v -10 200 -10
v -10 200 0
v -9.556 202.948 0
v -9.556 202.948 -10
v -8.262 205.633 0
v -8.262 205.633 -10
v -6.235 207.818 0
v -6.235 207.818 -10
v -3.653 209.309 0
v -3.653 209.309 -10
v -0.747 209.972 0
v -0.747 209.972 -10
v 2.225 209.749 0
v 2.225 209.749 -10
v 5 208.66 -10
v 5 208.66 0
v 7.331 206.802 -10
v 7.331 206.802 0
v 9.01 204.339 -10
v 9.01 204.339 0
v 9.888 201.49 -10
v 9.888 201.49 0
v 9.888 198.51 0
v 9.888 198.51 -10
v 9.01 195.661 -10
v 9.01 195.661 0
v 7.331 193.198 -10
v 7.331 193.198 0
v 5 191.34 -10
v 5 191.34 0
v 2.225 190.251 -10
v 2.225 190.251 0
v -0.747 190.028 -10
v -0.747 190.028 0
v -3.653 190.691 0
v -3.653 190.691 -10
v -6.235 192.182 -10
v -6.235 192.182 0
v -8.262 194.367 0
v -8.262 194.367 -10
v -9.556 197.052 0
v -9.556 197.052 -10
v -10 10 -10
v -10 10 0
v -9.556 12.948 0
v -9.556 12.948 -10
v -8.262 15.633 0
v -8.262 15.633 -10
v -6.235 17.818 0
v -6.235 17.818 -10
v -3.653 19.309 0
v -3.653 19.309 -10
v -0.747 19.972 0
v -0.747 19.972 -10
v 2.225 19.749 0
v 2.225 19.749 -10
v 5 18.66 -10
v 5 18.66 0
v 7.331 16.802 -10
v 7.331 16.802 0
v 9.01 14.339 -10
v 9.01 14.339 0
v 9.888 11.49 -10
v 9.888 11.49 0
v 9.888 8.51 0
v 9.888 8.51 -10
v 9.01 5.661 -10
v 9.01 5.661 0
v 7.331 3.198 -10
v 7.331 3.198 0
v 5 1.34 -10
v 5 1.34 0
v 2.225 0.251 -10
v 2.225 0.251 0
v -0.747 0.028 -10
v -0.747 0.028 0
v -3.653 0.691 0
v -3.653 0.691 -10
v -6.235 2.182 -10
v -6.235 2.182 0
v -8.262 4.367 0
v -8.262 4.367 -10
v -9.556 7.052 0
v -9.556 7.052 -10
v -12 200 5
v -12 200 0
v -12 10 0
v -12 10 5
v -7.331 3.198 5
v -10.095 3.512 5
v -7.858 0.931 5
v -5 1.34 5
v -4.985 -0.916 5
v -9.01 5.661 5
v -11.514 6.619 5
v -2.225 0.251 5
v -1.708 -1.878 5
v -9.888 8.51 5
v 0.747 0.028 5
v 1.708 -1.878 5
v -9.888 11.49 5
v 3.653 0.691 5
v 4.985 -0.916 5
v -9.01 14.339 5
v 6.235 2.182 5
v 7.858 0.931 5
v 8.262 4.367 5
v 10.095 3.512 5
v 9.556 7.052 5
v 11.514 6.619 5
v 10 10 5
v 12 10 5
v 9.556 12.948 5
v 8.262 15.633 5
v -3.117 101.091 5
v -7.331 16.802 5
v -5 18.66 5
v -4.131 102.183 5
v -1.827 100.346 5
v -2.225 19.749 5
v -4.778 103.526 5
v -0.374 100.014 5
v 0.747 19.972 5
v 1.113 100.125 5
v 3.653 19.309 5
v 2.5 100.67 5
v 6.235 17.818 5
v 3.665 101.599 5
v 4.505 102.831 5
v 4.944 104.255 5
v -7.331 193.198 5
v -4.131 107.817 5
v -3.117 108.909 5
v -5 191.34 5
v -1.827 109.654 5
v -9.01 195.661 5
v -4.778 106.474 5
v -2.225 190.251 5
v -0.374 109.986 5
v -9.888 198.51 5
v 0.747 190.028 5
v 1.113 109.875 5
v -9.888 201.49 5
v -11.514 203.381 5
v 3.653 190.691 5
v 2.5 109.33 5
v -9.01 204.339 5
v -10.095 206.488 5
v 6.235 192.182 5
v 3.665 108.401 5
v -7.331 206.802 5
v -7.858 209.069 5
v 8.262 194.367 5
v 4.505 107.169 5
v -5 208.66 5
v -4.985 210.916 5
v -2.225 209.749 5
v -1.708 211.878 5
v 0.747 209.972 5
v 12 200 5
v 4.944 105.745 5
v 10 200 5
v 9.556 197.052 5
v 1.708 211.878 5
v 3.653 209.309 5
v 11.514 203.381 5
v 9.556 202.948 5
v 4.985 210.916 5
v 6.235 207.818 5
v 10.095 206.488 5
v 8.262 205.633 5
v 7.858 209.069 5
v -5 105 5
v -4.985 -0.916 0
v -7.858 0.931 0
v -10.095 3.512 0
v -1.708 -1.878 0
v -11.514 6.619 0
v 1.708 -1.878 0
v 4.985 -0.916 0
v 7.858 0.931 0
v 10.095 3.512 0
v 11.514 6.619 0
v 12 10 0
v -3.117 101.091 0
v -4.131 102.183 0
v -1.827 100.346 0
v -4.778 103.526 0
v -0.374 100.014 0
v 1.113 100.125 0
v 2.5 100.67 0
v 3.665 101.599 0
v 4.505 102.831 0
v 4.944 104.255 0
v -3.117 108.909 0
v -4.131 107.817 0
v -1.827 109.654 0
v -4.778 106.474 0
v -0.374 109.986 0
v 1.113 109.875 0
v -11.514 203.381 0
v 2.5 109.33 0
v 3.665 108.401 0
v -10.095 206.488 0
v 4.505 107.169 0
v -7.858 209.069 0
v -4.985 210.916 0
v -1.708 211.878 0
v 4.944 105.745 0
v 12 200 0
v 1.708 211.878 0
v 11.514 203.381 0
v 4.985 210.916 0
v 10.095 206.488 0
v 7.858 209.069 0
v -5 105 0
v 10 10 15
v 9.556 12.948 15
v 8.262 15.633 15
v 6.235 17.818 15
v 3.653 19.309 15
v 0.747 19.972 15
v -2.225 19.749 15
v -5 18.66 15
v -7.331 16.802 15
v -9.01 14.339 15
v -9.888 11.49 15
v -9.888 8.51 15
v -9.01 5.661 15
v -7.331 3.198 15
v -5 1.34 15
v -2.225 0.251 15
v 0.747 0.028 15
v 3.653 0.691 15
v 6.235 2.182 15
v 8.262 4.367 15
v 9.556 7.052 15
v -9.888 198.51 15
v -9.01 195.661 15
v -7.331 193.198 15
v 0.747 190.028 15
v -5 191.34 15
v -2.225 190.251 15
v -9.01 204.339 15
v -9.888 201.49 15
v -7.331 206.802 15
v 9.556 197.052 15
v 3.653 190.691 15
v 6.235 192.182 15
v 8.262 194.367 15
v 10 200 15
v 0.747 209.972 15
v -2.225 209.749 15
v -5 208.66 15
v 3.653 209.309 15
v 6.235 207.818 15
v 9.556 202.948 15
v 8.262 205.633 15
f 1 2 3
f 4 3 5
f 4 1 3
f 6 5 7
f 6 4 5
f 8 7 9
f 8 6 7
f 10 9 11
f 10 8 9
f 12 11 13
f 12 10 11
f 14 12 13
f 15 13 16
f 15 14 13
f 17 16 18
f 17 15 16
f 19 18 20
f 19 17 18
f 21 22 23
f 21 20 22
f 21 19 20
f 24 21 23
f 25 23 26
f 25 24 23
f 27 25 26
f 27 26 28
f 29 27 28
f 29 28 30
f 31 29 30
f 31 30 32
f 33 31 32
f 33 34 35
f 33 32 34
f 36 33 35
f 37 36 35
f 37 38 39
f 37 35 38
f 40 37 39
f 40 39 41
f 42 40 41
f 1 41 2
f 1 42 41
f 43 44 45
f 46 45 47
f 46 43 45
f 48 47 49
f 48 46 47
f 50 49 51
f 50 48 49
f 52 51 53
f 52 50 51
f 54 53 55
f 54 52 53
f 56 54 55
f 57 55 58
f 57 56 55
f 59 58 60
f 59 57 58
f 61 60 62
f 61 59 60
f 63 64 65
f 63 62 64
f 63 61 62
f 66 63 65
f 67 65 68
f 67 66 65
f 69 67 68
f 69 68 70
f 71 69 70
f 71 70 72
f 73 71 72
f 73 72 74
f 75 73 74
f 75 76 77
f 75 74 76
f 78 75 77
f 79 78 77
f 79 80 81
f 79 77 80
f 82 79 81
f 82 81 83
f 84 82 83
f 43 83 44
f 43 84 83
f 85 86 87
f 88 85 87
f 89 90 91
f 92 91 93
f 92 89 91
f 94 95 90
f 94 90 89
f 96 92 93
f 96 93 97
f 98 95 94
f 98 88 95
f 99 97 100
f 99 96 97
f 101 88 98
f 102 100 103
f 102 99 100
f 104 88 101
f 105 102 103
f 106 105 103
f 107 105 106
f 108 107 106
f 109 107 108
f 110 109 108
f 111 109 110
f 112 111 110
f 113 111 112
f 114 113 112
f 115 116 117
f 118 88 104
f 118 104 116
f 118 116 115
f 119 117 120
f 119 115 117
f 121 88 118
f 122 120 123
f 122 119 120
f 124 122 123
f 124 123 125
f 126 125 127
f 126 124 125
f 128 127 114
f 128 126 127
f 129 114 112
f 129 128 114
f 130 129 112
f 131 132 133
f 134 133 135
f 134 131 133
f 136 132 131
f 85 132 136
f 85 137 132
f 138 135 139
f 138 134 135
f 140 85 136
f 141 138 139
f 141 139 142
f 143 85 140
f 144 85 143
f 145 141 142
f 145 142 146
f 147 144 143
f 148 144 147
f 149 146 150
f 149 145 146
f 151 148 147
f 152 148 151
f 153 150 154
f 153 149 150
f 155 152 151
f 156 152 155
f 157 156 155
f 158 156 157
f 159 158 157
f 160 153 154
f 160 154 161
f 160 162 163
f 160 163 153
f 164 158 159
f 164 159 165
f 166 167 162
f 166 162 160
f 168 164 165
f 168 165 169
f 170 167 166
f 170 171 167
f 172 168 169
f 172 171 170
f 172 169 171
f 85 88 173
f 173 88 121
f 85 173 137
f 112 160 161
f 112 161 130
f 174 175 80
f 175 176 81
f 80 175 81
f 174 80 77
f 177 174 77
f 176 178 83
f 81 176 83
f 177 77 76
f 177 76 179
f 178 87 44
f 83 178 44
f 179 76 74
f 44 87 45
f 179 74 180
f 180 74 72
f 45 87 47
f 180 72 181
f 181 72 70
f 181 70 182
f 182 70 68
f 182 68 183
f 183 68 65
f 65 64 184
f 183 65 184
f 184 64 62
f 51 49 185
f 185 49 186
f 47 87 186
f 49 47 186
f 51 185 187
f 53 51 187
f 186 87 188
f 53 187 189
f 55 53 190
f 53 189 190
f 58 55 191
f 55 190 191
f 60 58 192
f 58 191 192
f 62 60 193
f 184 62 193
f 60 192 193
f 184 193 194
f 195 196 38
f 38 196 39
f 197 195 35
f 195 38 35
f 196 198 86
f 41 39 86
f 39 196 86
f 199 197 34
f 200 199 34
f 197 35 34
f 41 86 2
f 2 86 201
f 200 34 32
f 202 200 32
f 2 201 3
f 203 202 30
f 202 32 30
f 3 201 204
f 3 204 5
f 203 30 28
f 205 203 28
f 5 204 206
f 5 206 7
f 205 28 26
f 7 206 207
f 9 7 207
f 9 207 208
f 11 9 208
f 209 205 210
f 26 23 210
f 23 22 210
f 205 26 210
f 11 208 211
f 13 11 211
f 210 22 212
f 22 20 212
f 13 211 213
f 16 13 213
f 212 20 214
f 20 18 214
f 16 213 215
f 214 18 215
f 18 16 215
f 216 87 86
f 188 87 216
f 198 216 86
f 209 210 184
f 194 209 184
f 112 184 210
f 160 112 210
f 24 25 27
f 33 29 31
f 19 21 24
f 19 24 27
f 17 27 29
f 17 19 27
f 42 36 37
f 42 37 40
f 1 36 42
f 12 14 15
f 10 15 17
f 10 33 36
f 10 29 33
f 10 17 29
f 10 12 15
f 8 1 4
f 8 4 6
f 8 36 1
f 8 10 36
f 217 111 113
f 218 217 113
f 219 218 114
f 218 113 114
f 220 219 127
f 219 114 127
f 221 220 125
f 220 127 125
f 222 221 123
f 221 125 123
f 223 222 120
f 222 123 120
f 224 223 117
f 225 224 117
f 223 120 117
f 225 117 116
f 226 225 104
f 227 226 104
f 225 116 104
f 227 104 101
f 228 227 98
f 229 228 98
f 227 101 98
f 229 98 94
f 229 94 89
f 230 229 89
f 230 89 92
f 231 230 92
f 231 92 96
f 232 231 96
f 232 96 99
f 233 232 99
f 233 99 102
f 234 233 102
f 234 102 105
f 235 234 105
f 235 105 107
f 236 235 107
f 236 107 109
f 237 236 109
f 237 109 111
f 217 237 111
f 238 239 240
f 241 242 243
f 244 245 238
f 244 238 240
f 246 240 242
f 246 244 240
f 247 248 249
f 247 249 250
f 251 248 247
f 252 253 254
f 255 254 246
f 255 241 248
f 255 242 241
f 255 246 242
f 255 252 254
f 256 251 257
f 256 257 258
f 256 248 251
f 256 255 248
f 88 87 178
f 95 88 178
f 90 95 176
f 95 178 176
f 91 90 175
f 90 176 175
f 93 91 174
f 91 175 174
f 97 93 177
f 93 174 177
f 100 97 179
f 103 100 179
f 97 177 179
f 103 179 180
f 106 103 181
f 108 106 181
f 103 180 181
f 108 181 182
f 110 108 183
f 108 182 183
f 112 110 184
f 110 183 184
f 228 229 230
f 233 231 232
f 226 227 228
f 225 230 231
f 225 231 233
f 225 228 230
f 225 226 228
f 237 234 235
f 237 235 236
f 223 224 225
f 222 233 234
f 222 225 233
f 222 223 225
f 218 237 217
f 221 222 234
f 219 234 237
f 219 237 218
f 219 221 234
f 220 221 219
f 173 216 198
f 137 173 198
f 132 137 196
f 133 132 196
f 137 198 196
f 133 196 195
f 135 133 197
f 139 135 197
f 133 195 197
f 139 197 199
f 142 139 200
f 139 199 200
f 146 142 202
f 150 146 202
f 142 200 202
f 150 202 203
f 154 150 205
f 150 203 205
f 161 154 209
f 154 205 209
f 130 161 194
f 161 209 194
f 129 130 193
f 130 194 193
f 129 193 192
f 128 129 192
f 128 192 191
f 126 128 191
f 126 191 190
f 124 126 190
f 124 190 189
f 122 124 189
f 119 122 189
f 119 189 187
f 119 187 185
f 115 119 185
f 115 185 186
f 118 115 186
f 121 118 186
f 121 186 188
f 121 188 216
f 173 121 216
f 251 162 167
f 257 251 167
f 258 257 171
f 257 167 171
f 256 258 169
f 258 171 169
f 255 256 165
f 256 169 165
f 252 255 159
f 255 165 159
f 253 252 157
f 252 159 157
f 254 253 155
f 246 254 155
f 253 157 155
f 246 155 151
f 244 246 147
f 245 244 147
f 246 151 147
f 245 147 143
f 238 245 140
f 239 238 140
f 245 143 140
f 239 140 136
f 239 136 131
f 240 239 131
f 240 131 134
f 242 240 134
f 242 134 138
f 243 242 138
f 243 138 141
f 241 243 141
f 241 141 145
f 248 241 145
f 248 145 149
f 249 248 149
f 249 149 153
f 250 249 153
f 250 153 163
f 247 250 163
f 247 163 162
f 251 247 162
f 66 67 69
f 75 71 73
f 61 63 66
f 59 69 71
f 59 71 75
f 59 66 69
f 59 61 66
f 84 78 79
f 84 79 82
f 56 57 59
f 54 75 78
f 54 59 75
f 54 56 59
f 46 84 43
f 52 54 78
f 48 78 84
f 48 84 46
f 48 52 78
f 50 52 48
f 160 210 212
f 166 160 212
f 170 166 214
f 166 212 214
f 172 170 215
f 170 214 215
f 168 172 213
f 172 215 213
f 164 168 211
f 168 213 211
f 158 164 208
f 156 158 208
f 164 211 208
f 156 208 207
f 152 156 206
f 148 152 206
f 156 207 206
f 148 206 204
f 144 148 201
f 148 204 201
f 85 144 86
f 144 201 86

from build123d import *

# Parameters (mm, degrees)
BOSS_EXTRUDE1_DEPTH = 5
SKETCH2_R           = 10
BOSS_EXTRUDE2_DEPTH = 10
SKETCH3_R           = 5
CUT_EXTRUDE1_DEPTH  = 10
BOSS_EXTRUDE3_START = 10
SKETCH4_R           = 10
BOSS_EXTRUDE3_DEPTH = 10
BOSS_EXTRUDE4_DEPTH = 5
SKETCH9_R           = 5
CUT_EXTRUDE4_DEPTH  = 35


with BuildPart() as part:
    # Sketch1 → Boss-Extrude1 (new body)
    with BuildSketch(Plane.XY):
        with BuildLine():
            Line((10, 10), (10, 200))
            ThreePointArc((10, 200), (0, 210), (-10, 200))
            Line((-10, 200), (-10, 10))
            ThreePointArc((-10, 10), (0, 0), (10, 10))
        make_face()
    extrude(amount=BOSS_EXTRUDE1_DEPTH)

    # Sketch2 → Boss-Extrude2 (add)
    with BuildSketch(Plane.XY.offset(5)):
        with Locations((0, 200)):
            Circle(SKETCH2_R)
        with Locations((0, 10)):
            Circle(SKETCH2_R)
    extrude(amount=BOSS_EXTRUDE2_DEPTH)

    # Sketch3 → Cut-Extrude1 (cut)
    with BuildSketch(Plane(origin=(0, 0, 0), x_dir=(-1, 0, 0), z_dir=(0, 0, -1))):
        with Locations((0, 105)):
            Circle(SKETCH3_R)
    extrude(amount=-CUT_EXTRUDE1_DEPTH, mode=Mode.SUBTRACT)

    # Sketch4 → Boss-Extrude3 (add)
    with BuildSketch(Plane(origin=(0, 0, 0), x_dir=(-1, 0, 0), z_dir=(0, 0, -1)).offset(BOSS_EXTRUDE3_START)):
        with Locations((0, 200)):
            Circle(SKETCH4_R)
        with Locations((0, 10)):
            Circle(SKETCH4_R)
    extrude(amount=-BOSS_EXTRUDE3_DEPTH)

    # Sketch5 → Boss-Extrude4 (add)
    with BuildSketch(Plane(origin=(0, 0, 0), x_dir=(-1, 0, 0), z_dir=(0, 0, -1))):
        with BuildLine():
            Line((12, 200), (12, 10))
            ThreePointArc((12, 10), (0, -2), (-12, 10))
            Line((-12, 10), (-12, 200))
            ThreePointArc((-12, 200), (0, 212), (12, 200))
        make_face()
    extrude(amount=-BOSS_EXTRUDE4_DEPTH)

    # Sketch9 → Cut-Extrude4 (cut)
    with BuildSketch(Plane(origin=(0, 0, 0), x_dir=(-1, 0, 0), z_dir=(0, 0, -1))):
        with Locations((0, 105)):
            Circle(SKETCH9_R)
    extrude(amount=-CUT_EXTRUDE4_DEPTH, mode=Mode.SUBTRACT)


solid = part.part
